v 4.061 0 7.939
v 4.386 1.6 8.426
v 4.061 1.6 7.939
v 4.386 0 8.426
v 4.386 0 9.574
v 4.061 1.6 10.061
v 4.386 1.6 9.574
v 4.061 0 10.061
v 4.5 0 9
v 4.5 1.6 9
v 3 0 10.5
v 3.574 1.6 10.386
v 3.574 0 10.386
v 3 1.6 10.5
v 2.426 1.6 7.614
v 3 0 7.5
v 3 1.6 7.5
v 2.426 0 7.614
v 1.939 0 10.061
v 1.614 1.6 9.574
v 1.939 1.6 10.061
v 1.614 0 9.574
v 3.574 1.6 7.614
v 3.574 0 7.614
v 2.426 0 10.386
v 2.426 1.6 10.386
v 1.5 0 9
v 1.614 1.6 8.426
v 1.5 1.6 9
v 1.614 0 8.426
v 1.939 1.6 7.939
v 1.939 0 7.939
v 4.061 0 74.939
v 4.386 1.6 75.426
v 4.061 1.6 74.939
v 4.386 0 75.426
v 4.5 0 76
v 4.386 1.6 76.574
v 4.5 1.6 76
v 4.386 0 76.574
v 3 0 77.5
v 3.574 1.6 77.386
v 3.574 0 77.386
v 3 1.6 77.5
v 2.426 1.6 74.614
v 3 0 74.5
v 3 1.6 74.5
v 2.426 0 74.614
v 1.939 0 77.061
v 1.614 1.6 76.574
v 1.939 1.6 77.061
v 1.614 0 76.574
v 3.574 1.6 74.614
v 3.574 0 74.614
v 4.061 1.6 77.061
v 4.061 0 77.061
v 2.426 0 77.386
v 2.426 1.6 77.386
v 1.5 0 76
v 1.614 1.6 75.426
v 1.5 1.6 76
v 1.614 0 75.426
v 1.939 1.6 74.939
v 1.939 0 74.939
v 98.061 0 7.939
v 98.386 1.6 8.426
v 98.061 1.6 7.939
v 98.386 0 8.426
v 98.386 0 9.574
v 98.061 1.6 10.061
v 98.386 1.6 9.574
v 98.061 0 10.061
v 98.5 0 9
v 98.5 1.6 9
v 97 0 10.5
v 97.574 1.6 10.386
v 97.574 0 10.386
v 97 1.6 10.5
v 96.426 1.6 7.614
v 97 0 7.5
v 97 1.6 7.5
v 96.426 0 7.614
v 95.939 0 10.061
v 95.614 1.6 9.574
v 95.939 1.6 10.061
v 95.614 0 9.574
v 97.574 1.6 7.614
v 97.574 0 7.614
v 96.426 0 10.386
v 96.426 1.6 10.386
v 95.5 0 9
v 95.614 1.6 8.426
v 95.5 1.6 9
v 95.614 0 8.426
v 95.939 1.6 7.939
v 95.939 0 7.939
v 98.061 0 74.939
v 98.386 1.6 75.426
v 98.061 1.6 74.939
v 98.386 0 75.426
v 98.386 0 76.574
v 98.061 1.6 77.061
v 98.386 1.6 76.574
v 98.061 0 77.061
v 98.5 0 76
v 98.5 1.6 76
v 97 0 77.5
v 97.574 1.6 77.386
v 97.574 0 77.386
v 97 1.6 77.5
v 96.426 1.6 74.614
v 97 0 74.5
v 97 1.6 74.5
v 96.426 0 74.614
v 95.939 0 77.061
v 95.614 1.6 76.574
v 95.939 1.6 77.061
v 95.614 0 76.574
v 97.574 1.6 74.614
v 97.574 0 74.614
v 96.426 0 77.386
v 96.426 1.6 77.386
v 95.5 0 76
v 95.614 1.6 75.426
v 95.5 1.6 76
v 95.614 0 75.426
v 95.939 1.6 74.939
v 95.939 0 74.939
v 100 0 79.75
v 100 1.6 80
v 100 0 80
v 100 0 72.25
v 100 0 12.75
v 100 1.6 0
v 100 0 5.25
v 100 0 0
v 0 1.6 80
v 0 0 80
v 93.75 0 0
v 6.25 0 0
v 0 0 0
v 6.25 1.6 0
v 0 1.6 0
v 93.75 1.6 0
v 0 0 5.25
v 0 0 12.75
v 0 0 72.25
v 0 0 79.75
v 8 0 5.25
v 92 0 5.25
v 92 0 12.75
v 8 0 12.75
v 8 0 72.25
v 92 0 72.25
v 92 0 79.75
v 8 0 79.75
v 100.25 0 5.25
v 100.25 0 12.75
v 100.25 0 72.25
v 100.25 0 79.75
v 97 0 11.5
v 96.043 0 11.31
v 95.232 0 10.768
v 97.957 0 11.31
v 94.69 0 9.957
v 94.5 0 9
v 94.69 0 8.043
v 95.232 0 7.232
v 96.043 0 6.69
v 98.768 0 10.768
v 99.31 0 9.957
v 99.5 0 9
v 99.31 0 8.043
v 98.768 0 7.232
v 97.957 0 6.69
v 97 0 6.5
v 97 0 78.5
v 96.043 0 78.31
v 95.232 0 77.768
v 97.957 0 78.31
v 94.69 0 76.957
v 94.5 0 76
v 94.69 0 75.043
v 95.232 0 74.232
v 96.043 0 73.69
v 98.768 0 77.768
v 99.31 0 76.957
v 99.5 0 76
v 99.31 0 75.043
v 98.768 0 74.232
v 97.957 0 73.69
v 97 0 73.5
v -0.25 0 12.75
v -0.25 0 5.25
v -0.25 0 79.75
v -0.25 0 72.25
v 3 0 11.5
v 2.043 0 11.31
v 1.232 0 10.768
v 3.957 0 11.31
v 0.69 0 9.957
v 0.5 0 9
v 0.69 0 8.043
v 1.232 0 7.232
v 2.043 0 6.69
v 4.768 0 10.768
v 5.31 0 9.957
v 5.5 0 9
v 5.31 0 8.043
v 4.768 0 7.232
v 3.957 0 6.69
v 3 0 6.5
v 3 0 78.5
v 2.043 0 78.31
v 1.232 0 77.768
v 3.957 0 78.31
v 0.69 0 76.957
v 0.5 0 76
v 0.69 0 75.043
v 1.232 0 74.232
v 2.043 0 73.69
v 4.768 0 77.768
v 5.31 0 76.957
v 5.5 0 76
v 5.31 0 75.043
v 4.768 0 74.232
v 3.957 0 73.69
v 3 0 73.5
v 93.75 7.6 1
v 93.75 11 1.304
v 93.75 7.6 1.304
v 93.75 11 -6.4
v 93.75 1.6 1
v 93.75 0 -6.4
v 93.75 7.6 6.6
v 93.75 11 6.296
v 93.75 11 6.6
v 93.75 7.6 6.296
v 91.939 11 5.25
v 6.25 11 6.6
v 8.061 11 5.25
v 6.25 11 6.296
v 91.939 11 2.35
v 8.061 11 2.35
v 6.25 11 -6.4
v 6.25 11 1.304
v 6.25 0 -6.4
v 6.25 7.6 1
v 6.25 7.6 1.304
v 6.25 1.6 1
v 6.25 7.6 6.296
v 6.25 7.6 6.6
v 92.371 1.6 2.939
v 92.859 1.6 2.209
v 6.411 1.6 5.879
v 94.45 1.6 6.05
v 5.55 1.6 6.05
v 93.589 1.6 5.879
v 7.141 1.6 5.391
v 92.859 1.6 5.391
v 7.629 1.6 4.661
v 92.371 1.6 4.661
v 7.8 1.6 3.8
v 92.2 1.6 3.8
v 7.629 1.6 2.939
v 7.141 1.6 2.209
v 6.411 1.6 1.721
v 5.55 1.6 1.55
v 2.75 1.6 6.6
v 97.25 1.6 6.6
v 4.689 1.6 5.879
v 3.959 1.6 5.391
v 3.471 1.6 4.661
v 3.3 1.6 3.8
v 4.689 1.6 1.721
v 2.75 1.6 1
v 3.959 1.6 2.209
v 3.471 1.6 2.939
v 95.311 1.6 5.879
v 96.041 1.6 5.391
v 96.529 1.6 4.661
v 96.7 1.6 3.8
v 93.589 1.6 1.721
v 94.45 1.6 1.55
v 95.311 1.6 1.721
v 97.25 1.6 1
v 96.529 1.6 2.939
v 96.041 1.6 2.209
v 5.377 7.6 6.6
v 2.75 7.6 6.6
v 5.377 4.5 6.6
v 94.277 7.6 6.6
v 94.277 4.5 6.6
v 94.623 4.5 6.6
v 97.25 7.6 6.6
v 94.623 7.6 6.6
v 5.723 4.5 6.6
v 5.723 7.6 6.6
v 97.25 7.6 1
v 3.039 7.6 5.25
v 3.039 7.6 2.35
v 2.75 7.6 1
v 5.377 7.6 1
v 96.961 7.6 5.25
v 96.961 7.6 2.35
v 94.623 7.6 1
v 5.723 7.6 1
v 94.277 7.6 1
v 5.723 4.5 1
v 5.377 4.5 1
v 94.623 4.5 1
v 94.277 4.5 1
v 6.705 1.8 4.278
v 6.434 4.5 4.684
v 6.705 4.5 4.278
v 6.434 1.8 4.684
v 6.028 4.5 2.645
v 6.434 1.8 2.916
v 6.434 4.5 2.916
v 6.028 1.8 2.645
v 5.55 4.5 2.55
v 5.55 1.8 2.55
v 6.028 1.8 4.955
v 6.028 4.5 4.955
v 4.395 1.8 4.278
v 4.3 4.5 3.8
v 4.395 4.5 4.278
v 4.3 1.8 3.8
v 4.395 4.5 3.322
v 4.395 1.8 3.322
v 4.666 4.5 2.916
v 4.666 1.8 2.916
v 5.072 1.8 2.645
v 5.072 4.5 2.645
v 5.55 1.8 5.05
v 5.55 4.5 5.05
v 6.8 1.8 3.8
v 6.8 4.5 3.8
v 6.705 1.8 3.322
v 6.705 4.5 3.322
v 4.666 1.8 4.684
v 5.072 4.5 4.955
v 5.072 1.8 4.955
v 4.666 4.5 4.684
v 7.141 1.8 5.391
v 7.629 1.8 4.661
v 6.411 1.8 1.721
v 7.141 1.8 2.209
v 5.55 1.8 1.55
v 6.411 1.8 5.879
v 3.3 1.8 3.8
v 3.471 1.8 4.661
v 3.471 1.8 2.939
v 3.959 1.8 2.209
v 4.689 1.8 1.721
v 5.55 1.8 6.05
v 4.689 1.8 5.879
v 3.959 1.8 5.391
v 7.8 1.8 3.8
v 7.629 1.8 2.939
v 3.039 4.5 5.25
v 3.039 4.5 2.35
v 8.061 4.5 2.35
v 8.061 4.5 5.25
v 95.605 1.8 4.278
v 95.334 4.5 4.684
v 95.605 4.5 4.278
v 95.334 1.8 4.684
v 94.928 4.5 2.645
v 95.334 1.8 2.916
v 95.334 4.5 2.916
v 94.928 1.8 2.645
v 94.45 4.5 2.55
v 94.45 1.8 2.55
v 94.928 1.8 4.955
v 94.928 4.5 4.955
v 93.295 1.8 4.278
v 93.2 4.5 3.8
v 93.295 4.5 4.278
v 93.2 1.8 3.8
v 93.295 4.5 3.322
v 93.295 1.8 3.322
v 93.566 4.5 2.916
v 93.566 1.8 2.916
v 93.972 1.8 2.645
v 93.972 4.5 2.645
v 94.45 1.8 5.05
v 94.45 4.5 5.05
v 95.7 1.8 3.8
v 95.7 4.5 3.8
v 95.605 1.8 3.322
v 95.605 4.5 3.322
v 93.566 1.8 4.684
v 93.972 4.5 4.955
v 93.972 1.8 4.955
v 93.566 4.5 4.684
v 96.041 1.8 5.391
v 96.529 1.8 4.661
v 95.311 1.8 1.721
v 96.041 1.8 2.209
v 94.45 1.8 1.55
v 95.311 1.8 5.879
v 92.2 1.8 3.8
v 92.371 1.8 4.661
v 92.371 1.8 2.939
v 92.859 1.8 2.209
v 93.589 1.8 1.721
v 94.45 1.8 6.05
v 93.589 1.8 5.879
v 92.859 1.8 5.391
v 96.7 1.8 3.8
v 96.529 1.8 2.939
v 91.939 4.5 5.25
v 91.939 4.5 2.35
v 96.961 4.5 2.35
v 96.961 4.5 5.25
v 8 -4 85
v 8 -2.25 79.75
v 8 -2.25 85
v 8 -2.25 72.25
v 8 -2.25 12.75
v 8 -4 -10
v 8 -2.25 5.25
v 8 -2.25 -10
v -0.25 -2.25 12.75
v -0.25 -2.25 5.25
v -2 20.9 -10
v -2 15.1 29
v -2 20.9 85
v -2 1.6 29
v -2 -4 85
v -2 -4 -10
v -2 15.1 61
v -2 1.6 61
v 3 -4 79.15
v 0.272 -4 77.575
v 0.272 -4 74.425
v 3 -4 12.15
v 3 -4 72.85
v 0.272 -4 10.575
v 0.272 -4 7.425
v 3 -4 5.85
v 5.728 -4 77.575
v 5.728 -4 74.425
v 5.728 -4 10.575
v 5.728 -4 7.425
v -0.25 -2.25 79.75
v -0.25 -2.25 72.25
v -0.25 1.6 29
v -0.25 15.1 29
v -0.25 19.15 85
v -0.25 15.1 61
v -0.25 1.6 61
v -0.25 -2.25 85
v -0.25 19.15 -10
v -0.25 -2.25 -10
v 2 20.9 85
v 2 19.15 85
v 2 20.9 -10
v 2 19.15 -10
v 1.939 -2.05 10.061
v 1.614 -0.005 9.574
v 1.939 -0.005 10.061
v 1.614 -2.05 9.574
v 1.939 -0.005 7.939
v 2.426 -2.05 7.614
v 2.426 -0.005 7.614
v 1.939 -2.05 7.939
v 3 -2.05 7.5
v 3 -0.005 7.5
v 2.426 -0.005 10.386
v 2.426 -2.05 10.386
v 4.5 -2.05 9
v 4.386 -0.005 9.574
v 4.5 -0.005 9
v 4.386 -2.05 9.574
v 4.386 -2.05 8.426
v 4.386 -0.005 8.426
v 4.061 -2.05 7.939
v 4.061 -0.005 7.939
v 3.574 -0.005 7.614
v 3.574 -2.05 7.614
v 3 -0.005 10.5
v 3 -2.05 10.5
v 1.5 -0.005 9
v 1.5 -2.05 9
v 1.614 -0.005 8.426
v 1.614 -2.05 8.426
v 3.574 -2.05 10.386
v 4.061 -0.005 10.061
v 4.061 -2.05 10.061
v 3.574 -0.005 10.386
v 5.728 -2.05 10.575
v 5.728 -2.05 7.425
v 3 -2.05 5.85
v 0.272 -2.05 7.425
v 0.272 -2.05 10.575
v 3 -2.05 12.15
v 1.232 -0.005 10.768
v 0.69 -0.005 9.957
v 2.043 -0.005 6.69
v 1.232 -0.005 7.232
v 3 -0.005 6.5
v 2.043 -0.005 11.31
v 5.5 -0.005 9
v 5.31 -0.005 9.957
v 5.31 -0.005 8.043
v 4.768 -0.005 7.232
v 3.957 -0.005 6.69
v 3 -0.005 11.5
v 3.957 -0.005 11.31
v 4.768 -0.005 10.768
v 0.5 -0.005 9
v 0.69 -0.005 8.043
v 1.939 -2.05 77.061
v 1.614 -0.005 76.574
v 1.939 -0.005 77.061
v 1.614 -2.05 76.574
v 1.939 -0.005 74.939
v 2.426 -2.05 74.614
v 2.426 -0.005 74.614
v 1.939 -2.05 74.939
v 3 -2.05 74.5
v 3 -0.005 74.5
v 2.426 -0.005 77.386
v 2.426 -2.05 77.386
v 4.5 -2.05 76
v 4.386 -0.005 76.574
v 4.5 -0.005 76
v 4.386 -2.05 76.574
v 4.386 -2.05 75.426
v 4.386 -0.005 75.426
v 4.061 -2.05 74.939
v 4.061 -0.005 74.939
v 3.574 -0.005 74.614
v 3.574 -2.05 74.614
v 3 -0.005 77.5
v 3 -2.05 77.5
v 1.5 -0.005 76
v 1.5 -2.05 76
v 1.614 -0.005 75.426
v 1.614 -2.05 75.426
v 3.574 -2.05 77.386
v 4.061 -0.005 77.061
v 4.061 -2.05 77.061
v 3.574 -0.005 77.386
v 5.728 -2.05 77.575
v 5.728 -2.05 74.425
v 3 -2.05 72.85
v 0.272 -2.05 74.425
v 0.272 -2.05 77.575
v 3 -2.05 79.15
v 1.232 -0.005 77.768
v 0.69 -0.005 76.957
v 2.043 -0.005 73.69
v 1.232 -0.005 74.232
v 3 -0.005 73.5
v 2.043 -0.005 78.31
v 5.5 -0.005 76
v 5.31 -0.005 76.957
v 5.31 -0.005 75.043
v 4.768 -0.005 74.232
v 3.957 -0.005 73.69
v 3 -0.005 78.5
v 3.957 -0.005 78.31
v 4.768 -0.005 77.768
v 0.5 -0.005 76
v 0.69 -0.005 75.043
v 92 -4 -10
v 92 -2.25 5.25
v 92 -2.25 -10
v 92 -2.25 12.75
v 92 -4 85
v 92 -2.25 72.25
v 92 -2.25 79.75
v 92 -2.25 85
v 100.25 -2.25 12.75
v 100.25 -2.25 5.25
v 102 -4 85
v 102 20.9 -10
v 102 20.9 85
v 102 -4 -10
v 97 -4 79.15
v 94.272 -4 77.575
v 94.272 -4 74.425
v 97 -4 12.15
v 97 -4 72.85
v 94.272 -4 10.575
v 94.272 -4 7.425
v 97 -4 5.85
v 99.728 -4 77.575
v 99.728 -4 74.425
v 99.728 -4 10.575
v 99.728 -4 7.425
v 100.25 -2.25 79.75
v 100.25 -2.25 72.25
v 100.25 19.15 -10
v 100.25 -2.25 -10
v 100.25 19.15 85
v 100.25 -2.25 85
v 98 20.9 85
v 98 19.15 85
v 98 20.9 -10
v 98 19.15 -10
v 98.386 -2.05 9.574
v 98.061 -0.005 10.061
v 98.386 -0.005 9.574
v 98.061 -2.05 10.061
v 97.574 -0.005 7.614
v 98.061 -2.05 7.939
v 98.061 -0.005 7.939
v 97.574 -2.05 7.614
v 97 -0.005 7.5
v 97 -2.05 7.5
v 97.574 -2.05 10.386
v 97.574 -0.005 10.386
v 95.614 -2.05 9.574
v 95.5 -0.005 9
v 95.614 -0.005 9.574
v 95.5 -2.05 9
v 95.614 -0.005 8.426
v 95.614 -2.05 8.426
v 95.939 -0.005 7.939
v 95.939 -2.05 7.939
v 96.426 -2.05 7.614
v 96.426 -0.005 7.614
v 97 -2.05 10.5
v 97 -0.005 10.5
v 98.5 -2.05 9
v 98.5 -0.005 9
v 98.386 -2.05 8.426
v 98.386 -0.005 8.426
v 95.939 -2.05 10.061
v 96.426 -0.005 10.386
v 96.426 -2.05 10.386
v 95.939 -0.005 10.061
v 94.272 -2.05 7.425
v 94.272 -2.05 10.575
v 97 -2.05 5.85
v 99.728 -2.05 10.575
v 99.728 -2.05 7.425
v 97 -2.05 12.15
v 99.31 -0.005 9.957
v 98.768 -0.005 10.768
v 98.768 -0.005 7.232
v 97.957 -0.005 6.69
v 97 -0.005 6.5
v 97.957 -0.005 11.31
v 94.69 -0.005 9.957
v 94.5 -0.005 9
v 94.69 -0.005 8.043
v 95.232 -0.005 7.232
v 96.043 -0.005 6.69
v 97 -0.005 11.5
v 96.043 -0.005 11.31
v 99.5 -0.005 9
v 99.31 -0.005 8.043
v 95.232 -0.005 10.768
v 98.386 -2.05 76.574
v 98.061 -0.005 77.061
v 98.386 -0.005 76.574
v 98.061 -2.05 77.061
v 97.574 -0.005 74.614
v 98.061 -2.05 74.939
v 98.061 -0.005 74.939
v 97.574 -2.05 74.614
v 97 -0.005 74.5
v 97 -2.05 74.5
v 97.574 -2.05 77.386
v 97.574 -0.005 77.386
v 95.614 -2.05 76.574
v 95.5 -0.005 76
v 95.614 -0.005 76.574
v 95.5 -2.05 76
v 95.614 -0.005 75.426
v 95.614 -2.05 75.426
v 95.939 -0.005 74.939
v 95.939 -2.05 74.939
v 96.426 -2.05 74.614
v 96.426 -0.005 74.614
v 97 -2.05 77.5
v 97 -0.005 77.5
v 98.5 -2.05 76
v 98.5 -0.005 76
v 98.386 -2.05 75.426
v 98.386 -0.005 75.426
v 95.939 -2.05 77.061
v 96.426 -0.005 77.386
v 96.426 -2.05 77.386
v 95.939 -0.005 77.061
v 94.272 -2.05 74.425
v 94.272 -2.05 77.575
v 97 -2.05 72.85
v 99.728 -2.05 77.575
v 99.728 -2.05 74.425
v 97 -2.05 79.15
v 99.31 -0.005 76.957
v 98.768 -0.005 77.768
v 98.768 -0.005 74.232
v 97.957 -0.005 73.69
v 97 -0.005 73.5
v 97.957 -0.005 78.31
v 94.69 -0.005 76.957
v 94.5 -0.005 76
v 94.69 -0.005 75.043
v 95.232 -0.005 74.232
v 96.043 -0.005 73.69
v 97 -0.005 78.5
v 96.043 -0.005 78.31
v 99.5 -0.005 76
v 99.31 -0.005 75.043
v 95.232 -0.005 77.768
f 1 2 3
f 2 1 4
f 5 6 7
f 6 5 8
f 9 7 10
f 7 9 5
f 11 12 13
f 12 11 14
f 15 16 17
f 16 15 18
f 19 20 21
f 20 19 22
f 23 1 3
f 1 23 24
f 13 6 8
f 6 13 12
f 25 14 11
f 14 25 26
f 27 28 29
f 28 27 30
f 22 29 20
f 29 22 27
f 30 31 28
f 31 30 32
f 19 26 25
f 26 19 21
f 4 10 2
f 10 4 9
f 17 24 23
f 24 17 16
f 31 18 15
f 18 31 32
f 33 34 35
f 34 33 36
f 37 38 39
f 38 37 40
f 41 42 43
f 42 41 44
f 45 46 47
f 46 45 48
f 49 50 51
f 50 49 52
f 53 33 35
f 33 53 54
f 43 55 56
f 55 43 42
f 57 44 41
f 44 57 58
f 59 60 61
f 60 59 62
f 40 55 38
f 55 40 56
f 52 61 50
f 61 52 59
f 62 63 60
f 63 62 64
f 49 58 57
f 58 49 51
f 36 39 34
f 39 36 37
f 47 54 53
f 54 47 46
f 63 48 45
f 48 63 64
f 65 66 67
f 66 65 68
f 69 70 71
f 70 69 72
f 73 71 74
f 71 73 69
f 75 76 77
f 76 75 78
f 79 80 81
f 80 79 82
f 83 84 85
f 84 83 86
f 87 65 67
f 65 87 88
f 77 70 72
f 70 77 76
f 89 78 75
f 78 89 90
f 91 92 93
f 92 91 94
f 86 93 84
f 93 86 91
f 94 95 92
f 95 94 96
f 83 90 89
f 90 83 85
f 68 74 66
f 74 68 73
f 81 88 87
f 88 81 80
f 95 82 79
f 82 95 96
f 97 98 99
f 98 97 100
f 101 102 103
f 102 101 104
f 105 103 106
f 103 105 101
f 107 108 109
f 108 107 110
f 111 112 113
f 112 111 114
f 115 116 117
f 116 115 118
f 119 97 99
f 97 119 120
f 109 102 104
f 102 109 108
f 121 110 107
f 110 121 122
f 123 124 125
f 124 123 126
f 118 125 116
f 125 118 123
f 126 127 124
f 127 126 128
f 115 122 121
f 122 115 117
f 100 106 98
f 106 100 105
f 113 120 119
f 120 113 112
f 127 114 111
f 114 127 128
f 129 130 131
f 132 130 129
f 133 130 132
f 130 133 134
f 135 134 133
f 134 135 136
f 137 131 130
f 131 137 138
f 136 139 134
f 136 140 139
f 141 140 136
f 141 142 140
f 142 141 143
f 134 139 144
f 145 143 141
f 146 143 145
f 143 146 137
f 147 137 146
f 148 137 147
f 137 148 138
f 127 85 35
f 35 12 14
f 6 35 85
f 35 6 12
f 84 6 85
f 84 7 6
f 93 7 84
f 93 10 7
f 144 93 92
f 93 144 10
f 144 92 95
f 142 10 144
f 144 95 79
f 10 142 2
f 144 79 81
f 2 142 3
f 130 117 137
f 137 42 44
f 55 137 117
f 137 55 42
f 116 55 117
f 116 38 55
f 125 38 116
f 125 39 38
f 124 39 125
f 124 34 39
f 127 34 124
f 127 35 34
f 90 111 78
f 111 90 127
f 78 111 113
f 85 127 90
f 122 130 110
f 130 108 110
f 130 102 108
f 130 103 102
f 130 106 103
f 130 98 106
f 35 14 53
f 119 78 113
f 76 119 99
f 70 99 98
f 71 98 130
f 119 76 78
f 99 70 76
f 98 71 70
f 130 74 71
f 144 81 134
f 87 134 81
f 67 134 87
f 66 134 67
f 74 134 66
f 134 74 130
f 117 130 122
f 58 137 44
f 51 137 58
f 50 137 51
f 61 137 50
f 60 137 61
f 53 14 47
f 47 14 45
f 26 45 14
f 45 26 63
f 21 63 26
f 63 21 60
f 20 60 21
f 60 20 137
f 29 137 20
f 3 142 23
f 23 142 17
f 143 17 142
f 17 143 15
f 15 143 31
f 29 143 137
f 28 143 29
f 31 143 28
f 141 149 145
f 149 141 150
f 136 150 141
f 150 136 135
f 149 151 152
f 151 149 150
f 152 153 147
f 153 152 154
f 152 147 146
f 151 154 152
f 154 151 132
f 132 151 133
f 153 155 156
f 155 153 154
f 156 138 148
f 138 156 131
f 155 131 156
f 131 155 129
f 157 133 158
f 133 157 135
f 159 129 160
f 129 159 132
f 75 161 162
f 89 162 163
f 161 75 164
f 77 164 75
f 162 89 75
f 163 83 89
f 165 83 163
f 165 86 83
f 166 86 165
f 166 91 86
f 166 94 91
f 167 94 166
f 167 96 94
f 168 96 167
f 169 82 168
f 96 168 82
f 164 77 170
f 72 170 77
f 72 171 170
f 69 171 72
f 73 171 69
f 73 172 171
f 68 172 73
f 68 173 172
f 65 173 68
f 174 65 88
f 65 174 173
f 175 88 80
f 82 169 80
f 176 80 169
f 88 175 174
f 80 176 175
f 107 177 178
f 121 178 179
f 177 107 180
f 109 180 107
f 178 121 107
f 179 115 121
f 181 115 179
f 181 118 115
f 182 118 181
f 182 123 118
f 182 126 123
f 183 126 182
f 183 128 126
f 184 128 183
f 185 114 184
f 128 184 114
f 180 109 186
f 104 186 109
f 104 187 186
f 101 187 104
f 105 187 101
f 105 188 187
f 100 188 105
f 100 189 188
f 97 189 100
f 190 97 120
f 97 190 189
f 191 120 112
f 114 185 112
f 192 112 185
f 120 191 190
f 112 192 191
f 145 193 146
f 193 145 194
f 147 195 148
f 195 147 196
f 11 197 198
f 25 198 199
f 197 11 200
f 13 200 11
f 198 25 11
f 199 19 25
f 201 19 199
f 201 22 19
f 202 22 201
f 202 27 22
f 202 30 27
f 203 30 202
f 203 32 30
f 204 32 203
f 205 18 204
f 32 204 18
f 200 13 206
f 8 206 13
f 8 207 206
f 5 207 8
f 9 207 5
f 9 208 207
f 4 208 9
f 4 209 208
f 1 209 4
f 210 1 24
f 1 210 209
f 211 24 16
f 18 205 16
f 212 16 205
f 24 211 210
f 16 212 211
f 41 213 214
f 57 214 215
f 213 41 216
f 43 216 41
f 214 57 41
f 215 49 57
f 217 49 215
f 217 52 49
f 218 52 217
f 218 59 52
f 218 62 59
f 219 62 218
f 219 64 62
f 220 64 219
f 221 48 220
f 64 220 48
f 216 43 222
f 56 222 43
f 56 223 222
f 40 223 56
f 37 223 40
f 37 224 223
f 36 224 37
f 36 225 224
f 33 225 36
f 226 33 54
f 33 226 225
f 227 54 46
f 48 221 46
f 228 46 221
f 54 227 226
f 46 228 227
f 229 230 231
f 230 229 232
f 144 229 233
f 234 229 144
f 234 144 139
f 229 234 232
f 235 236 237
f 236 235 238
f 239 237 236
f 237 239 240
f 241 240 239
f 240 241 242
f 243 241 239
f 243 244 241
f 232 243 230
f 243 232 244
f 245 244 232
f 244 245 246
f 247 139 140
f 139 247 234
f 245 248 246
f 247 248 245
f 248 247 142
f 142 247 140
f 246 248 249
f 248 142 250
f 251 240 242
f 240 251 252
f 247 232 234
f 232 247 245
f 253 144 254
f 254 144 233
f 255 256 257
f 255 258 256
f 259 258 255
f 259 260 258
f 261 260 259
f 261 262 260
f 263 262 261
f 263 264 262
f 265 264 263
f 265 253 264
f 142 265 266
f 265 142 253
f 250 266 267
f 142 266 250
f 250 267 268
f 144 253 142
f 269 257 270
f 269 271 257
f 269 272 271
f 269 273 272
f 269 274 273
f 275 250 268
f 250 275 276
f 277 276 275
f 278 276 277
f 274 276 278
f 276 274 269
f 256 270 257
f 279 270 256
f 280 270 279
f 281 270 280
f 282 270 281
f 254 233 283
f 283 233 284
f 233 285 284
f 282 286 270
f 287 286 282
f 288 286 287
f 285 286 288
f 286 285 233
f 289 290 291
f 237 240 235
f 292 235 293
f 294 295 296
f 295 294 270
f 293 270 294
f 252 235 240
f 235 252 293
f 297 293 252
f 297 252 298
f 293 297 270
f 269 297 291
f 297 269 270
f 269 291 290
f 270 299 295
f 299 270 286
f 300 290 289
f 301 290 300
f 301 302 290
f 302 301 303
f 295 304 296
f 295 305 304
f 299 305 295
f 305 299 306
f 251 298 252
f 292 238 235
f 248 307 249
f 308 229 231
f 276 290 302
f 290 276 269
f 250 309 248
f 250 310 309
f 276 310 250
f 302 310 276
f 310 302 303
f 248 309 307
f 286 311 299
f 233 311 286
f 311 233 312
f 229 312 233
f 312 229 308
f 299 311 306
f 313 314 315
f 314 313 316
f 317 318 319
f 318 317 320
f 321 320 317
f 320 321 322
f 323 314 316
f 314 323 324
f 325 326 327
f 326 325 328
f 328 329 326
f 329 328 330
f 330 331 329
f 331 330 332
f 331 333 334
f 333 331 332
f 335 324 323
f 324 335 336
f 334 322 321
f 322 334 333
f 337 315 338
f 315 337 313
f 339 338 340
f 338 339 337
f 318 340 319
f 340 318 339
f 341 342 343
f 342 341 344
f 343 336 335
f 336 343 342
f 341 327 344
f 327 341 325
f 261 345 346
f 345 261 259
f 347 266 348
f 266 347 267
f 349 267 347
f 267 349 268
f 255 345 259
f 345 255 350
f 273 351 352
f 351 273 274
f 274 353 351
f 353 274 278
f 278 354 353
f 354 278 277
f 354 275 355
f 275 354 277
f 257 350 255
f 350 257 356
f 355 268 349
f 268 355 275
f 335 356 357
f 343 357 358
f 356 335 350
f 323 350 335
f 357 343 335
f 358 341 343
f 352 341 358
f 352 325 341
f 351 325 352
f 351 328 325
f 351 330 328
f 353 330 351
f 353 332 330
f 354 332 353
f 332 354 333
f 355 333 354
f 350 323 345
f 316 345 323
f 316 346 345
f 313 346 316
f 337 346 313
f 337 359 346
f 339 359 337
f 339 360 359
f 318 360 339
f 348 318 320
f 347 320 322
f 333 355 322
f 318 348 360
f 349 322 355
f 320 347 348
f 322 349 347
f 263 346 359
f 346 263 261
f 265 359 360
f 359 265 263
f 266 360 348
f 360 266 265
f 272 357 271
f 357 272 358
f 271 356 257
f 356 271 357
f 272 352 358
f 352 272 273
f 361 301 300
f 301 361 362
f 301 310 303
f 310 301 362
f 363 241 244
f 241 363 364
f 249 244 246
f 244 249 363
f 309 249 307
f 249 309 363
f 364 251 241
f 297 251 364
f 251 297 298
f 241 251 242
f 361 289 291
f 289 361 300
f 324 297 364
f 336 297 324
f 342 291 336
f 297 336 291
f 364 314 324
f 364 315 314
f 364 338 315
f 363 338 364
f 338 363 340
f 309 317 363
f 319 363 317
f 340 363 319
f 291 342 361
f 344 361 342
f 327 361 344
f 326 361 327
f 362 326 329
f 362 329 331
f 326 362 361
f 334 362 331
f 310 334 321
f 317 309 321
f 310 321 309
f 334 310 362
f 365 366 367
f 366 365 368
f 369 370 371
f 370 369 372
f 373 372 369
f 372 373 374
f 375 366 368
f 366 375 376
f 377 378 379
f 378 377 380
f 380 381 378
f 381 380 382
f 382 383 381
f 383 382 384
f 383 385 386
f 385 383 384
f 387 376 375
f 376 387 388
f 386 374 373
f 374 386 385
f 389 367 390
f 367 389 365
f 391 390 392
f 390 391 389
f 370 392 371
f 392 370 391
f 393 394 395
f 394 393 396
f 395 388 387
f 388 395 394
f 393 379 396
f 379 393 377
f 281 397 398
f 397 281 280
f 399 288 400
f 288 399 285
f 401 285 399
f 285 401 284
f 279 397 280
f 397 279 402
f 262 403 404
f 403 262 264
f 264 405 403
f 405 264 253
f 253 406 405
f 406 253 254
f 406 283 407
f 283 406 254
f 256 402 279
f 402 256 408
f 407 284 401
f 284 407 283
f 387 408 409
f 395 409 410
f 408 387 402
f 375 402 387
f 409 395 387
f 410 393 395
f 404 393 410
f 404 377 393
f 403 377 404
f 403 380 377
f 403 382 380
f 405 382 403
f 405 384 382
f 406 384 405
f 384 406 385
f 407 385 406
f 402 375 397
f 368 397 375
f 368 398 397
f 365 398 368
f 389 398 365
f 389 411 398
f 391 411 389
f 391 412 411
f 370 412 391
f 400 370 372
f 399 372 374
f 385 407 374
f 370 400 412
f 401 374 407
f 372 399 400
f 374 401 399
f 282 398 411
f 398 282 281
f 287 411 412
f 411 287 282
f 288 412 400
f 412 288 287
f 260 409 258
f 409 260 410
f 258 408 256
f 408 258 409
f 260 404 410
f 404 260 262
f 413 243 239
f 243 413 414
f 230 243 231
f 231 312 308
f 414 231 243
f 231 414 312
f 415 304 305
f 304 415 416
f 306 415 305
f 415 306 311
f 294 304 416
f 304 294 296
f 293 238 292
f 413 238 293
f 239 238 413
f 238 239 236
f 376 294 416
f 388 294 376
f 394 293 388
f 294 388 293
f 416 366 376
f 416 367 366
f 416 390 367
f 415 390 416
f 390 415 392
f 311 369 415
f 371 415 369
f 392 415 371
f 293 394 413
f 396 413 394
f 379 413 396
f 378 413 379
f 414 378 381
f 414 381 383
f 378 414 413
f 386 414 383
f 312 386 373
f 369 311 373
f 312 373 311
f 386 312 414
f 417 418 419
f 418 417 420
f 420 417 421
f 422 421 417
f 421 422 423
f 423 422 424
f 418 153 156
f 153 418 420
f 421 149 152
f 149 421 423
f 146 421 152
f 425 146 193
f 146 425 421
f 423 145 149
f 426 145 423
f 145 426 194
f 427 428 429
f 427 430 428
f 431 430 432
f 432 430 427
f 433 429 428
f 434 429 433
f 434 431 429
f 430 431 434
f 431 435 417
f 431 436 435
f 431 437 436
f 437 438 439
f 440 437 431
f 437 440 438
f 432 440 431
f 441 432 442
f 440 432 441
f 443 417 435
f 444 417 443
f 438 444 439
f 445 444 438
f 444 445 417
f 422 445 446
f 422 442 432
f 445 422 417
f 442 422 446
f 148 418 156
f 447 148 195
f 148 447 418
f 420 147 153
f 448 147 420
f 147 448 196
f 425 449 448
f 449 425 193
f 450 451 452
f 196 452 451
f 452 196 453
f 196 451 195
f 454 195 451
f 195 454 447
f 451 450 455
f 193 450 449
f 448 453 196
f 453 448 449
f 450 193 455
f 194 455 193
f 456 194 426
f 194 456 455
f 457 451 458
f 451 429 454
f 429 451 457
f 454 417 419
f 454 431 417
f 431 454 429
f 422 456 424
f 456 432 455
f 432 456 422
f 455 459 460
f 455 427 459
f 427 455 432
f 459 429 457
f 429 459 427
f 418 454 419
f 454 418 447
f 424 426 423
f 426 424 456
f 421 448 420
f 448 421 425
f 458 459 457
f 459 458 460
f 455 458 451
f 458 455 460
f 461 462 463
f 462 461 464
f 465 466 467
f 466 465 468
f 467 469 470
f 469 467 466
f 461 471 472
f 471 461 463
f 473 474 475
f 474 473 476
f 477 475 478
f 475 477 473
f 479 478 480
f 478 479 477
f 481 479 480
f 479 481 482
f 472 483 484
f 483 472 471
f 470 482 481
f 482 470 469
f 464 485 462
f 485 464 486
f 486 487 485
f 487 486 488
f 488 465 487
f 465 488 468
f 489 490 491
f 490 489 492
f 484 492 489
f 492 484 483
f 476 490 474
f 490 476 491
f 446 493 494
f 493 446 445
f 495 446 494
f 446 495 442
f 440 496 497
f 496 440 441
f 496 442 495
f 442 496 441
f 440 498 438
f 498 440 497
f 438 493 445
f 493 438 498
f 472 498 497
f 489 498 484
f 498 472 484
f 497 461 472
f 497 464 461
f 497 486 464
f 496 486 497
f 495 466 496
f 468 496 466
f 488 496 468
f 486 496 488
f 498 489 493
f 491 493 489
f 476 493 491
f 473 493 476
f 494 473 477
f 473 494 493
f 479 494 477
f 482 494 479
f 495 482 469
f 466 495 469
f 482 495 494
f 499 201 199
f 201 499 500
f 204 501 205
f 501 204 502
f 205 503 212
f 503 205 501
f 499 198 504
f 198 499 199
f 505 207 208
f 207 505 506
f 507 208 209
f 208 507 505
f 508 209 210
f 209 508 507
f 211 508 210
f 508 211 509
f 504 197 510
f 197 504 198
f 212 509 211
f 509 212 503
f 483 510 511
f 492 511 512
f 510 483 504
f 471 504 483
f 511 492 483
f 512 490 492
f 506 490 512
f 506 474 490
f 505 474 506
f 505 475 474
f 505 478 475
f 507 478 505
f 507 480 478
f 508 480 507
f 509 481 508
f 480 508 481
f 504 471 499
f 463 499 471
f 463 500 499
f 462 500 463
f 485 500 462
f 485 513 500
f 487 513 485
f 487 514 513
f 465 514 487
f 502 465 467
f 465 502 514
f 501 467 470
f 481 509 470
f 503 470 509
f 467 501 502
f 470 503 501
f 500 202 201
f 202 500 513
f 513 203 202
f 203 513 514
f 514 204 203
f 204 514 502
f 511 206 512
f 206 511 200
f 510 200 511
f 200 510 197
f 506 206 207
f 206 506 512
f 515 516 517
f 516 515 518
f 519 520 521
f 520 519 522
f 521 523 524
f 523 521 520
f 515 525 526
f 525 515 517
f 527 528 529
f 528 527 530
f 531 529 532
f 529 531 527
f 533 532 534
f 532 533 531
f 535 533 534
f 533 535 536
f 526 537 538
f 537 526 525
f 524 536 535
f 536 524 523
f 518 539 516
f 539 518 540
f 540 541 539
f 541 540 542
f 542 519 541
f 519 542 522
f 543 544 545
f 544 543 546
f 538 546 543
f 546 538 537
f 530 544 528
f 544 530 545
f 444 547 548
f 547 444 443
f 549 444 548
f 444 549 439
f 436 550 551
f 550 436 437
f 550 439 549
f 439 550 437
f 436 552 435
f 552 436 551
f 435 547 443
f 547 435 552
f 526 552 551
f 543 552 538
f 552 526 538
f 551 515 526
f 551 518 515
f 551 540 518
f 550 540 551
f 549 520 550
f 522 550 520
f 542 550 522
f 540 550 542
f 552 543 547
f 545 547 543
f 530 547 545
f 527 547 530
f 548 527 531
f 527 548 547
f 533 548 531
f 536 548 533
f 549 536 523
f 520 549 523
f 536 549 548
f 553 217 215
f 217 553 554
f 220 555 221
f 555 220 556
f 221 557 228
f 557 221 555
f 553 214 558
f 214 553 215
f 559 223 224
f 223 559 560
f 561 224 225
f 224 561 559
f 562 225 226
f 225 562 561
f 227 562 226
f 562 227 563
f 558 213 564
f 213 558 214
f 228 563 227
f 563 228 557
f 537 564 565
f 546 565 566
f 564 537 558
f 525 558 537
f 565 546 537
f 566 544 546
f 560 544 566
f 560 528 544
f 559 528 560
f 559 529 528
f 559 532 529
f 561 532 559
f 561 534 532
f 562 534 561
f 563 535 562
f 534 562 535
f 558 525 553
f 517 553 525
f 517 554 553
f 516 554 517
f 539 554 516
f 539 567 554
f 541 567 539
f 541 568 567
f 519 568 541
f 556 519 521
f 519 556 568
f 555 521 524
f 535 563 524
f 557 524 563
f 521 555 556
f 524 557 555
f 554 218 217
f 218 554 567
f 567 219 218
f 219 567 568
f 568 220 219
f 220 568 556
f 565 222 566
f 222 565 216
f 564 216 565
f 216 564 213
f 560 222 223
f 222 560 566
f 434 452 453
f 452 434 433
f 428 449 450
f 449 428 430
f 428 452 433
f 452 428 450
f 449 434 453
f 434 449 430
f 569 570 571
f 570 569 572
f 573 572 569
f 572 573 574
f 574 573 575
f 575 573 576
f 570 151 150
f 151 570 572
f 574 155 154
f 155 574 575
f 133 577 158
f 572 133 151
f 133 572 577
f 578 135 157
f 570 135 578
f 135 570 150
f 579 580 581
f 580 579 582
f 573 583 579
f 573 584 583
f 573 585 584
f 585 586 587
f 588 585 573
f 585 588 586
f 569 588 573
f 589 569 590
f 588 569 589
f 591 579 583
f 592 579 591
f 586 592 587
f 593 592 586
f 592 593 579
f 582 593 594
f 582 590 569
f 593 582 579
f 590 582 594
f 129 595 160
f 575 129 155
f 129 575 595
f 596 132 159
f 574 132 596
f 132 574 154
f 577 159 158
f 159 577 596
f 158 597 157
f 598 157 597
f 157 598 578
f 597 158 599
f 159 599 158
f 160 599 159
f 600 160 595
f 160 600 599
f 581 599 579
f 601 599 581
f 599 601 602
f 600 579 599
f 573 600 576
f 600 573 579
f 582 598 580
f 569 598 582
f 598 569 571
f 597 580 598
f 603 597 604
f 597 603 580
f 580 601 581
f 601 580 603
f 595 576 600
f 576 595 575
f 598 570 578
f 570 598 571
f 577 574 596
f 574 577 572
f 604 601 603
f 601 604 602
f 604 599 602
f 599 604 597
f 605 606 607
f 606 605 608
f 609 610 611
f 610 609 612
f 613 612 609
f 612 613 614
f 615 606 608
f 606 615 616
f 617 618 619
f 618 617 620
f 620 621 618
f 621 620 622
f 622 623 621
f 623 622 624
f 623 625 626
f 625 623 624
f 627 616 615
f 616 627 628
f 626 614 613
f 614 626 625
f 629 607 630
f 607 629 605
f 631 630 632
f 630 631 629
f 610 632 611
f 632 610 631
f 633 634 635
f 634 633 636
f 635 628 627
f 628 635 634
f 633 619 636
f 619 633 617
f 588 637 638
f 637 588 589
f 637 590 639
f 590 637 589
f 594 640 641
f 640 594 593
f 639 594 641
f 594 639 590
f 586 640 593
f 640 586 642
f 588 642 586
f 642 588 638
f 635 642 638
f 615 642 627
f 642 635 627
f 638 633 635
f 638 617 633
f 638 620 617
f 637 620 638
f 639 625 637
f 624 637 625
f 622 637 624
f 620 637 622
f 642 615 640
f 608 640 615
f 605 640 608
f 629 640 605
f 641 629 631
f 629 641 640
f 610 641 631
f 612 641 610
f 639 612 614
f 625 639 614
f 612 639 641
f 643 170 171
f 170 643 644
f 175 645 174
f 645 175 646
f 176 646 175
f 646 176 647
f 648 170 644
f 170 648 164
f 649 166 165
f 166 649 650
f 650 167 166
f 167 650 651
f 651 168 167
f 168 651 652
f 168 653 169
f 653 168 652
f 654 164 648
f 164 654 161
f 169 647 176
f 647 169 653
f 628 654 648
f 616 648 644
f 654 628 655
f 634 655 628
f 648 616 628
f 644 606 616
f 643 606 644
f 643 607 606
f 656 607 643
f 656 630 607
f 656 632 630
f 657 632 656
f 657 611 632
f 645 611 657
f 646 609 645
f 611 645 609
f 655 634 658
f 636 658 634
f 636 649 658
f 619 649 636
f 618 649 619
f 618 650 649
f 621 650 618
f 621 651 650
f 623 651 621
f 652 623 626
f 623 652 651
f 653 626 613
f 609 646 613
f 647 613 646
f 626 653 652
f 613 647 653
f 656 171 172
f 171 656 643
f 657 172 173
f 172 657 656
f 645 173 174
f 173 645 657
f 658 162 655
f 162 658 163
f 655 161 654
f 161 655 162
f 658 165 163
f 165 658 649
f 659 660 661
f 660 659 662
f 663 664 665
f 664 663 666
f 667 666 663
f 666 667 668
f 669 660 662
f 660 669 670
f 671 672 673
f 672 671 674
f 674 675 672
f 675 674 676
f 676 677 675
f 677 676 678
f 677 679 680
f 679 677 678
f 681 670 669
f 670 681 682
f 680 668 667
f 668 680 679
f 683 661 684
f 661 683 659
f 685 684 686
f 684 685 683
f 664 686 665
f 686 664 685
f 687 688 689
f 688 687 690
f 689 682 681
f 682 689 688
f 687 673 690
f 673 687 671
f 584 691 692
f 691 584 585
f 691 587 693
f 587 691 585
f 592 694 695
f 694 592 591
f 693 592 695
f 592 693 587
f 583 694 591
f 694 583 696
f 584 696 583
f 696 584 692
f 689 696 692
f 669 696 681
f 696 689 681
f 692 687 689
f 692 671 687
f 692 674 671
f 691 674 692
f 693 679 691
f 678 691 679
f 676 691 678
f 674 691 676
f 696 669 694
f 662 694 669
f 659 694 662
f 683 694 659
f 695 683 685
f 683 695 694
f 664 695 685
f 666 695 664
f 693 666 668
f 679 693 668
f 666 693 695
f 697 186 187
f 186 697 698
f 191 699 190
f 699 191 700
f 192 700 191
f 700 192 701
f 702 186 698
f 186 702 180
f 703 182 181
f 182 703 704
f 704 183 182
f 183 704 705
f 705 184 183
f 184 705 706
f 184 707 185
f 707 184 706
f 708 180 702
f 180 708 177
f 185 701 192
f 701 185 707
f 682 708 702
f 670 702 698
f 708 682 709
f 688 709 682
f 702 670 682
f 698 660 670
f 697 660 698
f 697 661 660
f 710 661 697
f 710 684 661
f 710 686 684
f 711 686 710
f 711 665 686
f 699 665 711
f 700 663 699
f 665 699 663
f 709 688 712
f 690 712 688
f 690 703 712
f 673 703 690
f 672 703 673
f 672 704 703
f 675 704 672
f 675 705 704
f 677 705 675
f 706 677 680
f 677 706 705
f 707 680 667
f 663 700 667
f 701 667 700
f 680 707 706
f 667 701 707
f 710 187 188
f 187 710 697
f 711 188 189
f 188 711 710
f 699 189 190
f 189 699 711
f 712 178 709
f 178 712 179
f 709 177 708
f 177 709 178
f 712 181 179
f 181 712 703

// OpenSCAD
// file: ../library/din41612/din41612_male.scad
// din41612 male connector
// =======================

include <din41612_male_dim.scad>

use <../linurs/linurs_screw.scad>

module din41612_male(){ 
  // color("LightGrey")
  difference(){
    union(){
        translate([0,din41612_male_w1/2,din41612_male_h/2-din41612_male_h1])  
        cube([din41612_male_l1,
              din41612_male_w1,
              din41612_male_h],
             center=true);  
      translate([0,(din41612_male_w1-din41612_male_w)/2,(din41612_male_h-din41612_male_h1)/2]) 
        cube([din41612_male_l1,
              (din41612_male_w-din41612_male_w1),
              din41612_male_h-din41612_male_h1],
             center=true);  
      translate([0,din41612_male_w2/2+din41612_male_w1-din41612_male_w,din41612_male_h2/2])
        cube([din41612_male_l,
              din41612_male_w2,
              din41612_male_h2],
             center=true);  
    }
    for(i=[-1,1]){ // mounting holes
      translate([i*din41612_male_dl/2,
                 din41612_male_w1-din41612_male_w+din41612_male_w2/2, 
                 din41612_male_h1])
      rotate([180,0,90])screw_fix(
            w=din41612_male_h2, 
            d=M2_5, 
            type=head_cyl, 
            nut_sink=din41612_male_h,
            t=0);
    }
  }
}
din41612_male();  
// file: ../library/din41612/din41612_male_dim.scad
include <../linurs/linurs_screw_dim.scad>

// connector dimensions
din41612_male_l=94.5;    // lenght of the connector
din41612_male_l1=87.5;   // 
din41612_male_w=13;      // width of the connector
din41612_male_w1=6.4;    // 
din41612_male_w2=5.6;    // 
din41612_male_h=11;      // height of the connector
din41612_male_h1=1.6;    // 
din41612_male_h2=6;      // 

din41612_male_dl=88.9;   // distance between mounting holes
// file: ../library/din41612/din41612_female_dim.scad
include <../linurs/linurs_screw_dim.scad>

// connector dimensions
din41612_female_l=95;       // lenght of the connector
din41612_female_l1=85;      // lenght of the connector head
din41612_female_h=11.6;     // height of the connector
din41612_female_h1=5.2;     // height produced by the connector when pulgged in 
din41612_female_w=11;       // width of the connector
din41612_female_w1=8.5;     // width of the connector head

din41612_female_dl=90;      // distance between mounting holes
// file: ../pcb/pcb.scad
// pcb
// ===
// The pcb is the master object and has its 
// lower left corner solder side at the origin of the 
// coordinate system 

n=2;  // [1,2,3,4,5,6,7,8]
show_pcb="assemblies"; // [assemblies,assembly,pcb]

include <pcb_dim.scad>
include <../motherboard/motherboard_dim.scad>

use <../library/din41612/din41612_male.scad>

module pcb(){
  echo("pcb");  
  color("greenyellow")
  difference(){
    cube([pcb_l,pcb_h,pcb_w]); // pcb
    for(x=[-1,1]){ // mounting holes
      for(y=[pcb_wd1,pcb_wd1+pcb_wd]){
        translate([x*pcb_ld/2+pcb_l/2,0,y])
        rotate([90,0,0])
        cylinder(d=pcb_d,h=3*pcb_h,center=true,$fn=16);
      }
    }
  }
}

module pcb_assembly(){
  echo("pcb assembly");  
  pcb();  
  translate([pcb_l/2,pcb_h,0])  
  rotate([-90,0,0])din41612_male();  
}

module pcb_assemblies(n=1){
  echo("pcb assemblies"); 
  for(i=[0:n-1]){ // add the connectors
      echo(i);
      translate([0,step*i,0])
      pcb_assembly();
  }    
}    

if(show_pcb=="assemblies"){
  pcb_assemblies(n=n);
}

if(show_pcb=="assembly"){
  pcb_assembly();
}

if(show_pcb=="pcb"){
    // Move to center to create 2D drawings from top view 
    // with script OpenSCAD22d.py
    //
    rotate([90,0,180])
    //
    translate([-pcb_l/2,-pcb_h/2,-pcb_w/2])
    pcb();
}
// file: ../bracket/bracket.scad
// bracket
// =======
// A bracket of the elecbox module
// - type: 0 front bracket, 1 rear bracket
// - width 1..n in steps

// parameters for customizer
// bracket width
n=2; // [1,2,3,4,5,6,7,8]
// type
bracket="Front"; // [Front,Back]
// intermediate mounting holes
intermediate=false;  

include <../pcb/pcb_dim.scad>

include <../motherboard/motherboard_dim.scad>
include <../library/linurs/linurs_screw_dim.scad>
include <bracket_dim.scad>

use <../library/linurs/linurs_screw.scad>
    
module back_bracket(n=1, intermediate=false){
  mirror([1,0,0])       // mirror it if desired
  front_bracket(n=n, intermediate=intermediate); 
}
    
module front_bracket(n=1, intermediate=false){
  echo("bracket");  
  //color("White")
  intermediatestep=(intermediate)?step:0; 
  difference(){
    union(){
      translate([-bracket_h2/2-bracket_gap/2,
                 bracket_w(n)/2-bracket_w1,
                 bracket_l/2])  
      cube([bracket_h2,
            bracket_w(n),
            bracket_l],center=true); // create the bracket front
  
      translate([bracket_h/2-bracket_h2-bracket_gap/2,
                 bracket_t/2-bracket_w1,
                 bracket_l/2]) 
      cube([bracket_h,
            bracket_t,
            bracket_l],center=true); // U shape side of the screw
      
      translate([bracket_h1/2-bracket_h2-bracket_gap/2,
                 bracket_w(n)-bracket_w1-bracket_t/2,
                 bracket_l/2]) 
      cube([bracket_h1,
            bracket_t,
            bracket_l],center=true); // U shape where no screw  
      for(x=[1:n]){  // create the mounting hole cubes 
        for(z=[bracket_l1,
               bracket_l1+bracket_ld]){
          translate([ bracket_h/2-bracket_h2-bracket_gap/2,
                     -bracket_w1/2+(x-1)*intermediatestep,
                     z])
          cube([bracket_h,
                bracket_w1,
                bracket_l2],center=true);
        }
      }   
    }
    for(x=[1:n]){ // create the mounting hole 
      for(z=[bracket_l1,
             bracket_l1+bracket_ld]){
        translate([bracket_h3-bracket_h2-bracket_gap/2,
                  -bracket_w1/2+(x-1)*intermediatestep,
                   z])
        rotate([0,90,0])
        rotate([-90,0,0])
        screw_fix(w=bracket_w1,d=bracket_screw,type=head_no, t=bracket_screw_gap);
      }
    }
  }
}

if(bracket=="Front"){
  front_bracket(intermediate=intermediate,n=n);
}

if(bracket=="Back"){
  back_bracket(intermediate=intermediate,n=n);
}
// file: ../library/linurs/linurs_screw.scad
// Metric screws and nuts 
// urs@linurs.org 2019
// It is targeted for 3D printing applications. 
// To look realistic is not the goal (Example: Nuts do not have a hole)

include <linurs_screw_dim.scad>

d=0; //[0:M2_5,1:M3,2:M4,3:M5]
type=0;//[0:head_cyl,1:head_cnt,2:head_no,3:head_hex]
w=15; 
i=10;
nut_sink=0;
screw_sink=0; 
t=0.01;
fn=16;

/* [hex_bolt] */
show_hex_bolt=false;

/* [nut] */
show_nut=false;

/* [screw] */
show_screw=false;

/* [screw_fix] */
show_screw_fix=false;

/* [screw_cut] */
show_screw_cut=false;

/* [nut_cut] */
show_nut_cut=false;
wi=0; 
rot=false;

// functions used multiple times to position nuts and heads
function headh_cyl(d)=screw_cyl[d][1];  // height of cyl screw head
function headh_cnt(d)=screw_cyl[d][1];  // height of cnt screw head
function headh(d,type=head_cyl)=(type==head_cyl ? headh_cyl(d) : (type==head_cnt ? headh_cnt(d) : 0 )); // height of screw head 

function nuth(d)=screw_hex[d][2];   // height of hex nut

// head of a cylinder screw
module screw_head_cyl(d=M3, t=0)
{
  screwhd=screw_cyl[d][0]+t; // diameter of cylinder screw head
  cylinder(d=screwhd,h=headh(d=d, type=head_cyl), center=true,$fn=16); // screw head
}

// head of a countersunk screw
module screw_head_cnt(d=M3, t=0)
{
  screwd=screw_d[d]+t; 
  screwhd=screw_cnt[d][0]+t; // diameter of cylinder screw head
  cylinder(d1=screwd,d2=screwhd,h=headh(d=d,type=head_cnt), center=true,$fn=16); // screw head
}

// head of a hex screw
module screw_head_hex(d=M3, t=0)
{
    translate([0,0,-nuth(d)/2])nut(d=d, t=t);
}

// head of all screws
module screw_head(d=M3, type=head_cyl, t=0)
{ 
  if(type==head_cnt){
    screw_head_cnt(d=d, t=t);
  } else {
    if(type==head_cyl){
      screw_head_cyl(d=d, t=t);
    } else {
       if(type==head_hex){
           screw_head_hex(d=d, t=t); 
       } 
    }    
  }
}

// hex bolt 
module hex_bolt(d=M3, w=10, t=0)
{
  nutd=screw_hex[d][1]+t; // outer diameter of hex bolt
  cylinder(r=nutd/2,h=w+t, center=true,$fn=6); // nut
}

// nut 
module nut(d=M3, t=0)
{
  hex_bolt(d=d, w=nuth(d), t=t);    
}

// screw 
// w outer width of the screw = screw length + head 
module screw(w=10, d=M3, type=head_cyl, t=0){
  screwd=screw_d[d]+t;       // screw diameter
  cylinder(d=screwd, h=w, center=true,$fn=16); // screw thread length
  translate([0,0,w/2-headh(d=d,type=type)/2])
  screw_head(d=d,type=type, t=t);
}

// screw fix
// w outer width of the screw = screw length + head 
// sink additional material below to remove 
// raise additional material above to remove
module screw_fix(w=10, d=M3, type=head_cyl, screw_sink=0, nut_sink=0, t=0){
  screw(w=w, d=d, type=type, t=t);
  translate([0,0,-w/2+nuth(d)/2])
    nut(d=d,t=t);
  //additional material to be removed above the nut  
  translate([0,0,-(w+nut_sink)/2])hex_bolt(d=d,w=nut_sink+0.01,t=t);    
  //additional material to be removed above the screw head
  if(type==head_cnt){  
    translate([0,0,w/2+screw_sink])
    cylinder(d=screw_cnt[d][0]+t,h=screw_sink+0.01,center=true,$fn=16);
  }else{ 
    translate([0,0,(w+screw_sink)/2])
    cylinder(d=screw_cyl[d][0]+t,h=screw_sink+0.01,center=true,$fn=16);
  }     
}

// screw cut
// material to be extracted from object to slide in a counter sunk screw for fixation
// w height of the cut out
// i depth of the screw
module screw_cut(d=M3,w=20,i=10,t=0,fn=32){
    hsh=screw_cnt[d][1];
    ws=screw_cnt[d][0]+t;
    ds=screw_d[d]+t;
    
    translate([i/2,0,-(w-hsh)/2])
      cube([i,ws,hsh],center=true);
    
    translate([0,0,-(w-hsh)/2])
      cylinder(d=ws,h=hsh,center=true,$fn=32);
    
    translate([0,0,-(w-hsh)/2+hsh])
        cylinder(d2=ds, d1=ws, h=hsh,center=true,$fn=fn);
    
    cylinder(h=w, d=ds, center=true, $fn=fn);   
    
    translate([i/2,0,0]) 
        cube([i,ds,w],center=true);
    
    for(y=[-1,1]){
        translate([i/2,y*ds/2,-w/2+hsh])
            rotate([45,0,0])
            cube([i,sqrt(2)*(ws-ds)/2,sqrt(2)*(ws-ds)/2],center=true);
    }
}
//screw_cut();

// nut cut
// material to be extracted from object to slide in a nut for fixation
// w height of the cylinder
// i lenght of the inlet
module nut_cut(w=10, wi=0, d=M3, i=10, t=0, rot=false,type=head_cyl){ 
  r=(rot)?90:0;
  ds=(rot)?screw_hex[d][1]:screw_hex[d][0];
  rotate([0,0,r])nut(d,t);
  translate([i/2,0,0])
    cube([i,ds+t,nuth(d)+t],center=true);
  translate([0,0,-wi])
      if(type==head_cnt){    
          screw(w=w, d=d, type=type, t=t); 
        translate([0,0,w/2])
          cylinder(d=screw_cnt[d][0]+t,h=raise,center=true,$fn=16);
      }
      else{ 
          screw(w=w, d=d, type=type, t=t);   
  //      translate([0,0,0])
          //#cylinder(d=screw_cyl[d][0]+t,h=w,center=true,$fn=16);
      }       
}

if(show_hex_bolt==true){
   hex_bolt(d=d, w=w, t=t);
}

if(show_nut==true){
  nut(d=d, t=t);
}    

if(show_screw==true){
   screw(w=w, d=d, type=type, t=t);
}

if(show_screw_fix==true){
  screw_fix(w=w, d=d, type=type, nut_sink=nut_sink, screw_sink=screw_sink, t=t);
}

if(show_screw_cut==true){
  screw_cut(d=d,w=w,i=i,t=t,$fn=fn);
}    

if(show_nut_cut==true){
  nut_cut(w=w, wi=wi, d=d, i=i, t=t,rot=rot,type=type);
}  
// file: ../library/linurs/linurs_screw_dim.scad
// Metric screws and nuts 
// urs@linurs.org

// contains dimensions of linurs_screw and can be included in other 
// OpenScad files 

// Parameters in this file
// d screw diameter M2_5, M3, ... (enumeration with screw_d)
// t millimeters added to diameters 

// enumerations of metric threads
M2_5=0;
M3=1;
M4=2;
M5=3;

// enumerations screw head type
head_cyl=0; // cylinder
head_cnt=1; // countrsunk
head_no=2;  // no head at all
head_hex=3;  // no head at all

// screw diameters
screw_d=[
2.5, // M2.5
3.0, // M3
4.0, // M4
5.0  // M5
];

// sizes for hex nuts
screw_hex=[
//   s,   e,   h
 [ 5.0, 5.8, 1.7], // M2.5
 [ 5.5, 6.4, 2.0], // M3
 [ 7.0, 8.1, 2.8], // M4
 [ 8.0, 9.2, 3.5]  // M5
];

// sizes for cylinder screw heads
screw_cyl=[
//   d,   h
 [ 4.5, 1.6], // M2.5
 [ 5.5, 2.0], // M3
 [ 7.0, 2.6], // M4
 [ 8.5, 3.3]  // M5
];

// sizes for countersunk screw heads
screw_cnt=[
//   d,   h
 [ 4.7, 1.50], // M2.5
 [ 5.6, 1.65], // M3
 [ 7.4, 2.20], // M4
 [ 9.2, 2.50]  // M5
];
// file: ../motherboard/motherboard_dim.scad
include <../library/linurs/linurs_screw_dim.scad>
include <../library/din41612/din41612_female_dim.scad>
include <../library/din41612/din41612_male_dim.scad>
include <../pcb/pcb_dim.scad>
// motherboard pcb dimensions
motherboard_l=pcb_l;   // pcb width
motherboard_h=1.6;     // pcb thickness
step=25.4;             // distance between modules

function motherboard_w(n)=din41612_female_w+step*(n-1);

screw_motherboard_d=M2_5;
screw_motherboard_l=16;
motherboard_pass=0.5;// gap to fit screws 

motherboard_z_offset=-din41612_male_w1-din41612_female_h1-motherboard_h;
// file: ../bracket/bracket_dim.scad
// bracket

include <../pcb/pcb_dim.scad>
include <../motherboard/motherboard_dim.scad>
include <../library/linurs/linurs_screw_dim.scad>

bracket_screw=M2_5;   // hole for the screw

bracket_gap=0.5;      // gap between bracket to make sure it fits in the box
bracket_screw_gap=0.5;// gap to fit the screw

bracket_l=pcb_w+15;   // height of bracket
bracket_l1=19;        // hole l
bracket_l2=3*screw_d[bracket_screw];
bracket_ld=pcb_wd;    // hole distance

bracket_h=10;         // depth of the U shape at the side of the screw
bracket_h1=4;         // depth of the U shape at the side where no screw is 
bracket_h2=2-bracket_gap/2;   // thickness of bracket
bracket_h3=5;         // hole h

bracket_w1=4;         // height of the mounting hole cube
bracket_tn=2;         // thickness of bracket
bracket_t=bracket_tn-bracket_gap/2;  // thickness of bracket - gap

bracket_offset_z=-10;  // bracket offset in elecbox z axis

function bracket_w(n)=step*n-bracket_gap;
function bracket_w2(n)=step*n-2*bracket_tn;
// file: ../pcb/pcb_dim.scad
// The pcb is the master object of the project
// therefore no other include files from other objects
// are necessary

// pcb constants
pcb_l =100;  // lenght of the pcb
pcb_ld = 94; // hole distance 
pcb_w=80;    // height of the pcb
pcb_wd = 67; // hole distance
pcb_wd1 = 9; // hole to edge distance 
pcb_d=3;     // diameter of holes
pcb_h=1.6;   // thickness
// main file
// RS232 module
// ============

RS232="assembly"; // [assembly,front,back,print_front,print_back]

include <../pcb/pcb_dim.scad>
include <../bracket/bracket_dim.scad>
include <../motherboard/motherboard_dim.scad>
include <../library/linurs/linurs_screw_dim.scad>

use <../library/linurs/linurs_screw.scad>
use <../bracket/bracket.scad>
use <../pcb/pcb.scad>

module RS232_back(){
        translate([0,0,bracket_offset_z])back_bracket(n=1);
}

module RS232_front(){
    h1=13.5;
    w1=32;
    z1=29;
    difference(){
        translate([0,0,bracket_offset_z])front_bracket(n=1);
          translate([
          0,
          h1/2+pcb_h,
          z1+w1/2])
        cube([
          bracket_h,
          h1,
          w1],center=true);
    }
}

module RS232_assembly(){
    pcb_assembly();
    RS232_front();
    translate([pcb_l,0,0])RS232_back();
}

if(RS232=="front"){
  RS232_front();
}

if(RS232=="back"){
  RS232_back();
}

if(RS232=="assembly"){
  RS232_assembly();
}

if(RS232=="print_front"){
  rotate([0,-90,0])
    RS232_front();
}

if(RS232=="print_back"){
  rotate([0,90,0])RS232_back();
}
